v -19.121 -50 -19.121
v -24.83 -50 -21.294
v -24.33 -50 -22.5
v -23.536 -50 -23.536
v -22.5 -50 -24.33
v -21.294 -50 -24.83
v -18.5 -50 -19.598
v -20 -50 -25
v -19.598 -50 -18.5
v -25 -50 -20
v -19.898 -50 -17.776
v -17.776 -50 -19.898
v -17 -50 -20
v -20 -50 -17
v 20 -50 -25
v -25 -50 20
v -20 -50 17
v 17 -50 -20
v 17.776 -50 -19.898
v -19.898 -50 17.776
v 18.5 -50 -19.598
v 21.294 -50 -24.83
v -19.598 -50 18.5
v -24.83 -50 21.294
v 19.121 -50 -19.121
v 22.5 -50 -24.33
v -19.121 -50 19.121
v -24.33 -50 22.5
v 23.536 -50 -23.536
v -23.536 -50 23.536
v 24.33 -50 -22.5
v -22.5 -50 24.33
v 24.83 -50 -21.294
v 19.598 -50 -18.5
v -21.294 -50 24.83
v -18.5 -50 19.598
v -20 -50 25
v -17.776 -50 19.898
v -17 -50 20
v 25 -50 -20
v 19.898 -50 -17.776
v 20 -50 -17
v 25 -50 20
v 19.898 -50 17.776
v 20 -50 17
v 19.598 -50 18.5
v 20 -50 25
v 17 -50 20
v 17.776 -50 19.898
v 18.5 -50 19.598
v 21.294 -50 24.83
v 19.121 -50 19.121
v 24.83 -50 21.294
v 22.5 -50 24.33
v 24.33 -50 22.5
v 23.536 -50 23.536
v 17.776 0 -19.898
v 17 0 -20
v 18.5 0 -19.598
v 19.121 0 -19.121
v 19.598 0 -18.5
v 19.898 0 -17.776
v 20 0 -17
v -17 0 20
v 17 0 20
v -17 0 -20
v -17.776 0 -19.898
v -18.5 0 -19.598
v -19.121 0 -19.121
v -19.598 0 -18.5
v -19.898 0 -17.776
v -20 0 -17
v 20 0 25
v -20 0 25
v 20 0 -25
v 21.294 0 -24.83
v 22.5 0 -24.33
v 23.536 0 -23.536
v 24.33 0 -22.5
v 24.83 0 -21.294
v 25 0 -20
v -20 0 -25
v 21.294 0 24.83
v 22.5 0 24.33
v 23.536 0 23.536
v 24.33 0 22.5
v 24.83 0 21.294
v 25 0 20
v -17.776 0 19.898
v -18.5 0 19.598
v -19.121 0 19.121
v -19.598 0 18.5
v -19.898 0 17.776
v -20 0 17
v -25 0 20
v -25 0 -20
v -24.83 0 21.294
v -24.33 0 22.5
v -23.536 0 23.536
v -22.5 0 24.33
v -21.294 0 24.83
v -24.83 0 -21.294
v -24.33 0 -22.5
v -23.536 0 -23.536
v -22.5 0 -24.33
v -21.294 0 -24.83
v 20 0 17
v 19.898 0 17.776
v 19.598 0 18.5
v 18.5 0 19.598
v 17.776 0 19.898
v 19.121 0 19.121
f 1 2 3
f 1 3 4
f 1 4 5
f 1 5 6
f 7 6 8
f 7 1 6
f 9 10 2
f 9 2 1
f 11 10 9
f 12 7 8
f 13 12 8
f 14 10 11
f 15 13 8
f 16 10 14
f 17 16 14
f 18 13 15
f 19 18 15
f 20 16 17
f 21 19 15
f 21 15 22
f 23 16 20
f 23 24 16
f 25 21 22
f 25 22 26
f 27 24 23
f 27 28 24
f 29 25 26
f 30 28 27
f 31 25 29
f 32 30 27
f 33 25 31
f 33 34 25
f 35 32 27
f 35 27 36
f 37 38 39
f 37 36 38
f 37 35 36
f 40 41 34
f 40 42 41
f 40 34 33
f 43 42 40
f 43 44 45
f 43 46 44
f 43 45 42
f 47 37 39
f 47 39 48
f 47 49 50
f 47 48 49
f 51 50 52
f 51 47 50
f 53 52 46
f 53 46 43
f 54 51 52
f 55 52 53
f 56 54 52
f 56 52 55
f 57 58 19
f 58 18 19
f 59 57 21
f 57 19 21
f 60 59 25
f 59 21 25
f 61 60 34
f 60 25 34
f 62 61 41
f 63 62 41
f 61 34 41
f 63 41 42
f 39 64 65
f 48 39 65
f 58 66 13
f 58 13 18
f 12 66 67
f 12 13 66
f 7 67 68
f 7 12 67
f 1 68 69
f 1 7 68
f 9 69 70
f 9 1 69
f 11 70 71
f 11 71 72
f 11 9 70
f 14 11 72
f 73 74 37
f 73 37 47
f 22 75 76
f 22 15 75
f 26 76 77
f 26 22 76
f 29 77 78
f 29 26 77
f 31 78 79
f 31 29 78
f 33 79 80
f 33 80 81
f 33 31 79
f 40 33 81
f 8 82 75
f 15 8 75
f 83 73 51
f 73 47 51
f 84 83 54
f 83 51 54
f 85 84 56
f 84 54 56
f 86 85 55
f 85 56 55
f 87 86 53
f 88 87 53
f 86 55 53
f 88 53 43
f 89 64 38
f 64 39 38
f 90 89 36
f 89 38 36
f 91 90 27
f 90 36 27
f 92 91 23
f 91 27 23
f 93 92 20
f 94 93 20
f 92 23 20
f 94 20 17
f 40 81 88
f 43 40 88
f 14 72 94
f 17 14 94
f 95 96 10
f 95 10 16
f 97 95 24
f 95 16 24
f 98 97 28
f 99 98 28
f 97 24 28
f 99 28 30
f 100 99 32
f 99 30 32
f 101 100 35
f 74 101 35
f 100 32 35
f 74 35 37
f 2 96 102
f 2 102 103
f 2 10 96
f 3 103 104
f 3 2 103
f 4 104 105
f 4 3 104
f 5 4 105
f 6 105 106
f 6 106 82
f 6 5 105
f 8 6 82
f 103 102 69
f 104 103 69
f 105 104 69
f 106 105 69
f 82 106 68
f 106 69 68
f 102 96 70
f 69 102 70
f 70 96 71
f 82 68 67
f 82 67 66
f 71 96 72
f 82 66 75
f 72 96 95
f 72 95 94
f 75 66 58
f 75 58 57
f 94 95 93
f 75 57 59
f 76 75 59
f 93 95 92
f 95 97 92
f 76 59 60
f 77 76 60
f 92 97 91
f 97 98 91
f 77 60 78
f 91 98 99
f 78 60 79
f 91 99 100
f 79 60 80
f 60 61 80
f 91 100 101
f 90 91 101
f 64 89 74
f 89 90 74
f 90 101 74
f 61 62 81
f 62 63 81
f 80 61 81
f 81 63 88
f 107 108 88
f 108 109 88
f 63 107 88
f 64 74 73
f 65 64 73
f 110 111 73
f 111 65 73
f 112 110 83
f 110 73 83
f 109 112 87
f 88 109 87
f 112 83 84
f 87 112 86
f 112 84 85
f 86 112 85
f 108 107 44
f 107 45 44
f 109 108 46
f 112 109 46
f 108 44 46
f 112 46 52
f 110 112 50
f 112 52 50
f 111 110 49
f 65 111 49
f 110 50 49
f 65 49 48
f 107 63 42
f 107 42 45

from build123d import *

# Parameters (mm, degrees)
F0_W     = 50
F0_H     = 50
F0_W_2   = 40
F0_H_2   = 40
F1_DEPTH = 50
F2_R     = 5
F3_R     = 3


with BuildPart() as f1:
    # F0 (on Front) → F1 (new body)
    with BuildSketch(Plane.XZ):
        Rectangle(F0_W, F0_H)
        Rectangle(F0_W_2, F0_H_2, mode=Mode.SUBTRACT)
    extrude(amount=F1_DEPTH)

    # F2
    f2_edges = [f1.edges().sort_by_distance(p)[0] for p in [
        (25, -25, 25),
        (-25, -25, 25),
        (25, -25, -25),
        (-25, -25, -25),
    ]]
    fillet(f2_edges, radius=F2_R)

    # F3
    f3_edges = [f1.edges().sort_by_distance(p)[0] for p in [
        (20, -25, 20),
        (-20, -25, 20),
        (-20, -25, -20),
        (20, -25, -20),
    ]]
    fillet(f3_edges, radius=F3_R)


solid = f1.part
